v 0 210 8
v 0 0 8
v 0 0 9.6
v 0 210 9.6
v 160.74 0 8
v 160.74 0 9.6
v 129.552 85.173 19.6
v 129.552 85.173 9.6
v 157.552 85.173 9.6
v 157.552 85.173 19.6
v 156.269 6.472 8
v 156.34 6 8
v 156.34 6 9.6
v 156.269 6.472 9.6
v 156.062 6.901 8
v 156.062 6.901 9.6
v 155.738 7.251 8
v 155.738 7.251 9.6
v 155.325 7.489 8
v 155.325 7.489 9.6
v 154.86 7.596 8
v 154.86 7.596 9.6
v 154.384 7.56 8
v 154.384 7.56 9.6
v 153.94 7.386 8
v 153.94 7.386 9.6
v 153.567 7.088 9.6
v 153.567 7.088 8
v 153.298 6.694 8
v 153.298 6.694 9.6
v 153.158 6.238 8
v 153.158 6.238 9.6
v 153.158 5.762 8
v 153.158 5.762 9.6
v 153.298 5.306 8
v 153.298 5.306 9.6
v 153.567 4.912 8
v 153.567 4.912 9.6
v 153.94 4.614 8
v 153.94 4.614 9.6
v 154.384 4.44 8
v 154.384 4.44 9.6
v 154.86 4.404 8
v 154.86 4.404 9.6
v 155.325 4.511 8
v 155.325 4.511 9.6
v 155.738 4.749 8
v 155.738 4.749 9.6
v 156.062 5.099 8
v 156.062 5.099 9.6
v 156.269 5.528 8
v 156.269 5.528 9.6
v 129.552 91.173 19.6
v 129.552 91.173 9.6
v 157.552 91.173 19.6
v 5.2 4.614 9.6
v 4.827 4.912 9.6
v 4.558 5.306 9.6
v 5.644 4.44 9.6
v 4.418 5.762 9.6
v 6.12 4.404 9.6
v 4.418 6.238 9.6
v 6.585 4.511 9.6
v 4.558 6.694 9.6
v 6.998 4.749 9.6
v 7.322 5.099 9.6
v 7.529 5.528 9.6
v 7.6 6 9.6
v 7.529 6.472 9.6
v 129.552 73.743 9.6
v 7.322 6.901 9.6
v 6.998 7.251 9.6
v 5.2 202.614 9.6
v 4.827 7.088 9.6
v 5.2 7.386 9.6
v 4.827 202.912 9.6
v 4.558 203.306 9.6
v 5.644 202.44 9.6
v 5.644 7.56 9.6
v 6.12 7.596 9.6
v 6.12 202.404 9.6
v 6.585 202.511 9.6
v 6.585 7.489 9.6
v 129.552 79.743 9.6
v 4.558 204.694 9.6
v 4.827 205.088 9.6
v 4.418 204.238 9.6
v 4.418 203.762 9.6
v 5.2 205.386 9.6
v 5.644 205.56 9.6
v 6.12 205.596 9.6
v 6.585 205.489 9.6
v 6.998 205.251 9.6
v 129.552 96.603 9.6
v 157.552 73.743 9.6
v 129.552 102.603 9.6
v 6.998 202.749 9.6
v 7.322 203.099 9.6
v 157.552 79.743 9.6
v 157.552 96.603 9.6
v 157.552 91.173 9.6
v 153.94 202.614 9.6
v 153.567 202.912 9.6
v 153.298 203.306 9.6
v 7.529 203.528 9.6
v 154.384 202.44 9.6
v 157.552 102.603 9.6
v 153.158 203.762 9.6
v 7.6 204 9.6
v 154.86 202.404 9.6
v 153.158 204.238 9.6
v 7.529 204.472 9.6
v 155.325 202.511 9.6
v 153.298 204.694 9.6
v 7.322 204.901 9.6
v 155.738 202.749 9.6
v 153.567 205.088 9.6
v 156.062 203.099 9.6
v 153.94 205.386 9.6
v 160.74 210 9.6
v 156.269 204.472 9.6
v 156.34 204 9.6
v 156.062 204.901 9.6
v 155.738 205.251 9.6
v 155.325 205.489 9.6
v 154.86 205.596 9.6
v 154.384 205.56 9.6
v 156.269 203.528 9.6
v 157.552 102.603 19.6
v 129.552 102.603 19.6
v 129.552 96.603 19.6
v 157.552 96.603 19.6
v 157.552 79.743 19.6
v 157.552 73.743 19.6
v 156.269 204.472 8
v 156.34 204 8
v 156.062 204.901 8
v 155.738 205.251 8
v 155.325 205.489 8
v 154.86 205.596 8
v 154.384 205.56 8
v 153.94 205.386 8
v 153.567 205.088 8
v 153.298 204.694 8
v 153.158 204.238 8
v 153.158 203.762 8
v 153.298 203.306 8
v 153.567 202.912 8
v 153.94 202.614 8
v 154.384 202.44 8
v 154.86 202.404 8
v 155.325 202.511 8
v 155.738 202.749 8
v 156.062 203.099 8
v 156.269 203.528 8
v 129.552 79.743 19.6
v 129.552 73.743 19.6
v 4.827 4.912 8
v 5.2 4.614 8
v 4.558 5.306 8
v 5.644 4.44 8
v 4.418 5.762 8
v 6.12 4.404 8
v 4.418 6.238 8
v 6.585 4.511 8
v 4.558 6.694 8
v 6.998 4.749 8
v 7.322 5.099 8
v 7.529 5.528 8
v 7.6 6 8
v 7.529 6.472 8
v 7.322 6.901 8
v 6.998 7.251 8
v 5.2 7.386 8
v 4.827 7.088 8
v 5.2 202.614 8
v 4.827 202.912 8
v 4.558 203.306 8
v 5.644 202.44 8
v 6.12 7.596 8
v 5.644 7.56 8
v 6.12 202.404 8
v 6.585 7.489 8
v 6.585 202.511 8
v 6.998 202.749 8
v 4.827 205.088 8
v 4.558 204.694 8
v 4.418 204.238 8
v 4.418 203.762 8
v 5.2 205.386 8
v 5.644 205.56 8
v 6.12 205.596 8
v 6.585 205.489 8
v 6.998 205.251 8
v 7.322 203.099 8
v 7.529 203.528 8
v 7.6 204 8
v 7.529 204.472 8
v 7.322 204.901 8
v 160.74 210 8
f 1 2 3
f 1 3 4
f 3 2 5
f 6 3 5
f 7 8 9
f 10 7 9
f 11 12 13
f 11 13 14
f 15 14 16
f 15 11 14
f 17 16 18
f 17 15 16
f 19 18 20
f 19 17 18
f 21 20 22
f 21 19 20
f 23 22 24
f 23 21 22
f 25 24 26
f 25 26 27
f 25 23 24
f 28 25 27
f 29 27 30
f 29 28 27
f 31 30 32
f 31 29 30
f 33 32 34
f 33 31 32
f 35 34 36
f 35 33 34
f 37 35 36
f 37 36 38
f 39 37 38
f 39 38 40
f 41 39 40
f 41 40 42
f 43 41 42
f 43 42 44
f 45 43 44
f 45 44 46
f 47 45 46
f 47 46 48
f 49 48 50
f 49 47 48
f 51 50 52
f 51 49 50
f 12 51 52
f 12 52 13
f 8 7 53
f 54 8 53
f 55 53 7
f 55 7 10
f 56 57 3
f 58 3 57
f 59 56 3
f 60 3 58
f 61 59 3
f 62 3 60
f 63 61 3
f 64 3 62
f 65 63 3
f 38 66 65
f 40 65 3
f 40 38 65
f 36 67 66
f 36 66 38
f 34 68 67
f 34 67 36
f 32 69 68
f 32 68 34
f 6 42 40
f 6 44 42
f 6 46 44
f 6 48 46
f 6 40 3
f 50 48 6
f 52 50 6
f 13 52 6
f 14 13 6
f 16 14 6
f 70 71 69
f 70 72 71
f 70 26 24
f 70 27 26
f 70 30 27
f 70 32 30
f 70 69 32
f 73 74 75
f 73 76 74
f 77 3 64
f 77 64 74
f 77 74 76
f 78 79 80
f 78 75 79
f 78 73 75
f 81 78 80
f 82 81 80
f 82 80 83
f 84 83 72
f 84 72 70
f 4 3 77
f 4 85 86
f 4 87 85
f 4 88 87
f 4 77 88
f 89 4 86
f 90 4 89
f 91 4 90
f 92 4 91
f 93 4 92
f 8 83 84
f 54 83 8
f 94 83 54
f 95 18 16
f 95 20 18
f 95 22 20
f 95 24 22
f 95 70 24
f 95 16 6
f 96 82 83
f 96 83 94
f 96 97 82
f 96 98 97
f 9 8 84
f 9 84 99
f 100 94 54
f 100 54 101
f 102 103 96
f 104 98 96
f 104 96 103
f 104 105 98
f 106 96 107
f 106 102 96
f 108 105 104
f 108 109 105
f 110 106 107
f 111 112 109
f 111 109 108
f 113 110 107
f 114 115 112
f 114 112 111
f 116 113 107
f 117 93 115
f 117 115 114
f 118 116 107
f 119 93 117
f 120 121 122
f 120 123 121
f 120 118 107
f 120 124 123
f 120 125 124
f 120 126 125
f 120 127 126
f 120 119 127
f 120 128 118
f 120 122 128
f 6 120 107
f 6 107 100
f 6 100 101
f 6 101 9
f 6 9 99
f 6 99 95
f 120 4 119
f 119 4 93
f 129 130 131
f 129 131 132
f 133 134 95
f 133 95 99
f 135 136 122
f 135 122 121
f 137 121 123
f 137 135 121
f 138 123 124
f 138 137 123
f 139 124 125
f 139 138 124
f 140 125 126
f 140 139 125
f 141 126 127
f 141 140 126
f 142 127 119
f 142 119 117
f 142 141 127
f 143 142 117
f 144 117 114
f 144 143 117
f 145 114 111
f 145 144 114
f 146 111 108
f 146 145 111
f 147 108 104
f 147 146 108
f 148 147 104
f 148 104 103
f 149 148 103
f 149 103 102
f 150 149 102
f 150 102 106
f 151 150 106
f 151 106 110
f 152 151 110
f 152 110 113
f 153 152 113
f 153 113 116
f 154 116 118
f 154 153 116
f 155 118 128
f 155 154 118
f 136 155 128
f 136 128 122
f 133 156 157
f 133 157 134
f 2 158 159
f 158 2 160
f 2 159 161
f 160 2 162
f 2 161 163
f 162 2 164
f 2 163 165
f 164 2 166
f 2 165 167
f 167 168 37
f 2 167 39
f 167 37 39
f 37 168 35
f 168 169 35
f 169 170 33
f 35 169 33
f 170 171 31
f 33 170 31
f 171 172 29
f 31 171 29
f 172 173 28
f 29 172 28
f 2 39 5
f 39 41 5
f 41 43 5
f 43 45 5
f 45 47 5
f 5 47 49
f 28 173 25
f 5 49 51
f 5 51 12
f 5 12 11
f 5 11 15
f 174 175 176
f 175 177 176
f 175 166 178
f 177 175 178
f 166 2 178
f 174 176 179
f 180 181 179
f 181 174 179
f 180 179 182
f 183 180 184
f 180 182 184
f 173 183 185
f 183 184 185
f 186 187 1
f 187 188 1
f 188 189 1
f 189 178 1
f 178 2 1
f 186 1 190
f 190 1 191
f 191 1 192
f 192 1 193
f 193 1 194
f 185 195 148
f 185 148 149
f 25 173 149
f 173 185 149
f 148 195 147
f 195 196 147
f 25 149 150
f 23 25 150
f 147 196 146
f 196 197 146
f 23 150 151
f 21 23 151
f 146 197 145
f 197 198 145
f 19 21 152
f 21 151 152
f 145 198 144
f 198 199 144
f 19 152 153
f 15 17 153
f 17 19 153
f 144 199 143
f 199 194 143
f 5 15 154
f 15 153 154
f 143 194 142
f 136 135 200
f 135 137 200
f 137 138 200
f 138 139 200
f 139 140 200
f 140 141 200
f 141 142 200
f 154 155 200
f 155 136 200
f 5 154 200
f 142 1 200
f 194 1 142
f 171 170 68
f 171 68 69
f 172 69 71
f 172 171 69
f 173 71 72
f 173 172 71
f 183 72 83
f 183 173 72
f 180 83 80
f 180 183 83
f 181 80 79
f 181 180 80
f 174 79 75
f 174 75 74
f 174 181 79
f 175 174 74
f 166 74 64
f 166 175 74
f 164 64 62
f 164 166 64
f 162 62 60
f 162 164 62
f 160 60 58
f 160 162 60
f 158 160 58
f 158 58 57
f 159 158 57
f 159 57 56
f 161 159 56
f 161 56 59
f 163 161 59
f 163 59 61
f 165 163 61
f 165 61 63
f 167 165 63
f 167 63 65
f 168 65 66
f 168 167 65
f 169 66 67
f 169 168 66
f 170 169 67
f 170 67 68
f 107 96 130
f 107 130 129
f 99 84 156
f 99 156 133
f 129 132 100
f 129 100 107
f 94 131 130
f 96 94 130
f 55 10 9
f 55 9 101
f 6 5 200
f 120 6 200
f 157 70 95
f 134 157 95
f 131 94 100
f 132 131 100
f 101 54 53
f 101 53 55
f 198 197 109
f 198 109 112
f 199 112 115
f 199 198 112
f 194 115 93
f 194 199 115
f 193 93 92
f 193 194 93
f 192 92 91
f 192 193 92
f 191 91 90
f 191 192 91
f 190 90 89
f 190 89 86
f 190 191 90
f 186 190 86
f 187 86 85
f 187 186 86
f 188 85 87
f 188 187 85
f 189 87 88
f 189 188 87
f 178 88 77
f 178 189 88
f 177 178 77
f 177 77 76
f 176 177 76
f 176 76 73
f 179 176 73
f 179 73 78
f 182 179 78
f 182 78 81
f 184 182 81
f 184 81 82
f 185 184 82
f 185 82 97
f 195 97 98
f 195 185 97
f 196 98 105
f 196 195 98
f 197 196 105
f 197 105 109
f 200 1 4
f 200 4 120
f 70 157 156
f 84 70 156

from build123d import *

# Parameters (mm, degrees)
SKETCH002_W      = 160.74
SKETCH002_H      = 210
SKETCH002_R      = 1.6
EXTRUDE002_DEPTH = 1.6
SKETCH007_W      = 28
SKETCH007_H      = 6
EXTRUDE007_DEPTH = 10


with BuildPart() as extrude002:
    # Sketch002 → Extrude002 (new body)
    with BuildSketch(Plane.XY.offset(8)):
        with Locations((80.37, 105)):
            Rectangle(SKETCH002_W, SKETCH002_H)
        with Locations((6, 204)):
            Circle(SKETCH002_R, mode=Mode.SUBTRACT)
        with Locations((154.74, 204)):
            Circle(SKETCH002_R, mode=Mode.SUBTRACT)
        with Locations((154.74, 6)):
            Circle(SKETCH002_R, mode=Mode.SUBTRACT)
        with Locations((6, 6)):
            Circle(SKETCH002_R, mode=Mode.SUBTRACT)
    extrude(amount=EXTRUDE002_DEPTH)


with BuildPart() as cl:
    # Sketch007 (on Face10 of Extrude002) → Extrude007 (new body)
    with BuildSketch(Plane.XY.offset(9.6)):
        with Locations((143.552, 99.603)):
            Rectangle(SKETCH007_W, SKETCH007_H)
        with Locations((143.552, 88.173)):
            Rectangle(SKETCH007_W, SKETCH007_H)
        with Locations((143.552, 76.743)):
            Rectangle(SKETCH007_W, SKETCH007_H)
    extrude(amount=EXTRUDE007_DEPTH)

    # Fusion002: union Extrude002
    add(extrude002.part)


solid = cl.part
